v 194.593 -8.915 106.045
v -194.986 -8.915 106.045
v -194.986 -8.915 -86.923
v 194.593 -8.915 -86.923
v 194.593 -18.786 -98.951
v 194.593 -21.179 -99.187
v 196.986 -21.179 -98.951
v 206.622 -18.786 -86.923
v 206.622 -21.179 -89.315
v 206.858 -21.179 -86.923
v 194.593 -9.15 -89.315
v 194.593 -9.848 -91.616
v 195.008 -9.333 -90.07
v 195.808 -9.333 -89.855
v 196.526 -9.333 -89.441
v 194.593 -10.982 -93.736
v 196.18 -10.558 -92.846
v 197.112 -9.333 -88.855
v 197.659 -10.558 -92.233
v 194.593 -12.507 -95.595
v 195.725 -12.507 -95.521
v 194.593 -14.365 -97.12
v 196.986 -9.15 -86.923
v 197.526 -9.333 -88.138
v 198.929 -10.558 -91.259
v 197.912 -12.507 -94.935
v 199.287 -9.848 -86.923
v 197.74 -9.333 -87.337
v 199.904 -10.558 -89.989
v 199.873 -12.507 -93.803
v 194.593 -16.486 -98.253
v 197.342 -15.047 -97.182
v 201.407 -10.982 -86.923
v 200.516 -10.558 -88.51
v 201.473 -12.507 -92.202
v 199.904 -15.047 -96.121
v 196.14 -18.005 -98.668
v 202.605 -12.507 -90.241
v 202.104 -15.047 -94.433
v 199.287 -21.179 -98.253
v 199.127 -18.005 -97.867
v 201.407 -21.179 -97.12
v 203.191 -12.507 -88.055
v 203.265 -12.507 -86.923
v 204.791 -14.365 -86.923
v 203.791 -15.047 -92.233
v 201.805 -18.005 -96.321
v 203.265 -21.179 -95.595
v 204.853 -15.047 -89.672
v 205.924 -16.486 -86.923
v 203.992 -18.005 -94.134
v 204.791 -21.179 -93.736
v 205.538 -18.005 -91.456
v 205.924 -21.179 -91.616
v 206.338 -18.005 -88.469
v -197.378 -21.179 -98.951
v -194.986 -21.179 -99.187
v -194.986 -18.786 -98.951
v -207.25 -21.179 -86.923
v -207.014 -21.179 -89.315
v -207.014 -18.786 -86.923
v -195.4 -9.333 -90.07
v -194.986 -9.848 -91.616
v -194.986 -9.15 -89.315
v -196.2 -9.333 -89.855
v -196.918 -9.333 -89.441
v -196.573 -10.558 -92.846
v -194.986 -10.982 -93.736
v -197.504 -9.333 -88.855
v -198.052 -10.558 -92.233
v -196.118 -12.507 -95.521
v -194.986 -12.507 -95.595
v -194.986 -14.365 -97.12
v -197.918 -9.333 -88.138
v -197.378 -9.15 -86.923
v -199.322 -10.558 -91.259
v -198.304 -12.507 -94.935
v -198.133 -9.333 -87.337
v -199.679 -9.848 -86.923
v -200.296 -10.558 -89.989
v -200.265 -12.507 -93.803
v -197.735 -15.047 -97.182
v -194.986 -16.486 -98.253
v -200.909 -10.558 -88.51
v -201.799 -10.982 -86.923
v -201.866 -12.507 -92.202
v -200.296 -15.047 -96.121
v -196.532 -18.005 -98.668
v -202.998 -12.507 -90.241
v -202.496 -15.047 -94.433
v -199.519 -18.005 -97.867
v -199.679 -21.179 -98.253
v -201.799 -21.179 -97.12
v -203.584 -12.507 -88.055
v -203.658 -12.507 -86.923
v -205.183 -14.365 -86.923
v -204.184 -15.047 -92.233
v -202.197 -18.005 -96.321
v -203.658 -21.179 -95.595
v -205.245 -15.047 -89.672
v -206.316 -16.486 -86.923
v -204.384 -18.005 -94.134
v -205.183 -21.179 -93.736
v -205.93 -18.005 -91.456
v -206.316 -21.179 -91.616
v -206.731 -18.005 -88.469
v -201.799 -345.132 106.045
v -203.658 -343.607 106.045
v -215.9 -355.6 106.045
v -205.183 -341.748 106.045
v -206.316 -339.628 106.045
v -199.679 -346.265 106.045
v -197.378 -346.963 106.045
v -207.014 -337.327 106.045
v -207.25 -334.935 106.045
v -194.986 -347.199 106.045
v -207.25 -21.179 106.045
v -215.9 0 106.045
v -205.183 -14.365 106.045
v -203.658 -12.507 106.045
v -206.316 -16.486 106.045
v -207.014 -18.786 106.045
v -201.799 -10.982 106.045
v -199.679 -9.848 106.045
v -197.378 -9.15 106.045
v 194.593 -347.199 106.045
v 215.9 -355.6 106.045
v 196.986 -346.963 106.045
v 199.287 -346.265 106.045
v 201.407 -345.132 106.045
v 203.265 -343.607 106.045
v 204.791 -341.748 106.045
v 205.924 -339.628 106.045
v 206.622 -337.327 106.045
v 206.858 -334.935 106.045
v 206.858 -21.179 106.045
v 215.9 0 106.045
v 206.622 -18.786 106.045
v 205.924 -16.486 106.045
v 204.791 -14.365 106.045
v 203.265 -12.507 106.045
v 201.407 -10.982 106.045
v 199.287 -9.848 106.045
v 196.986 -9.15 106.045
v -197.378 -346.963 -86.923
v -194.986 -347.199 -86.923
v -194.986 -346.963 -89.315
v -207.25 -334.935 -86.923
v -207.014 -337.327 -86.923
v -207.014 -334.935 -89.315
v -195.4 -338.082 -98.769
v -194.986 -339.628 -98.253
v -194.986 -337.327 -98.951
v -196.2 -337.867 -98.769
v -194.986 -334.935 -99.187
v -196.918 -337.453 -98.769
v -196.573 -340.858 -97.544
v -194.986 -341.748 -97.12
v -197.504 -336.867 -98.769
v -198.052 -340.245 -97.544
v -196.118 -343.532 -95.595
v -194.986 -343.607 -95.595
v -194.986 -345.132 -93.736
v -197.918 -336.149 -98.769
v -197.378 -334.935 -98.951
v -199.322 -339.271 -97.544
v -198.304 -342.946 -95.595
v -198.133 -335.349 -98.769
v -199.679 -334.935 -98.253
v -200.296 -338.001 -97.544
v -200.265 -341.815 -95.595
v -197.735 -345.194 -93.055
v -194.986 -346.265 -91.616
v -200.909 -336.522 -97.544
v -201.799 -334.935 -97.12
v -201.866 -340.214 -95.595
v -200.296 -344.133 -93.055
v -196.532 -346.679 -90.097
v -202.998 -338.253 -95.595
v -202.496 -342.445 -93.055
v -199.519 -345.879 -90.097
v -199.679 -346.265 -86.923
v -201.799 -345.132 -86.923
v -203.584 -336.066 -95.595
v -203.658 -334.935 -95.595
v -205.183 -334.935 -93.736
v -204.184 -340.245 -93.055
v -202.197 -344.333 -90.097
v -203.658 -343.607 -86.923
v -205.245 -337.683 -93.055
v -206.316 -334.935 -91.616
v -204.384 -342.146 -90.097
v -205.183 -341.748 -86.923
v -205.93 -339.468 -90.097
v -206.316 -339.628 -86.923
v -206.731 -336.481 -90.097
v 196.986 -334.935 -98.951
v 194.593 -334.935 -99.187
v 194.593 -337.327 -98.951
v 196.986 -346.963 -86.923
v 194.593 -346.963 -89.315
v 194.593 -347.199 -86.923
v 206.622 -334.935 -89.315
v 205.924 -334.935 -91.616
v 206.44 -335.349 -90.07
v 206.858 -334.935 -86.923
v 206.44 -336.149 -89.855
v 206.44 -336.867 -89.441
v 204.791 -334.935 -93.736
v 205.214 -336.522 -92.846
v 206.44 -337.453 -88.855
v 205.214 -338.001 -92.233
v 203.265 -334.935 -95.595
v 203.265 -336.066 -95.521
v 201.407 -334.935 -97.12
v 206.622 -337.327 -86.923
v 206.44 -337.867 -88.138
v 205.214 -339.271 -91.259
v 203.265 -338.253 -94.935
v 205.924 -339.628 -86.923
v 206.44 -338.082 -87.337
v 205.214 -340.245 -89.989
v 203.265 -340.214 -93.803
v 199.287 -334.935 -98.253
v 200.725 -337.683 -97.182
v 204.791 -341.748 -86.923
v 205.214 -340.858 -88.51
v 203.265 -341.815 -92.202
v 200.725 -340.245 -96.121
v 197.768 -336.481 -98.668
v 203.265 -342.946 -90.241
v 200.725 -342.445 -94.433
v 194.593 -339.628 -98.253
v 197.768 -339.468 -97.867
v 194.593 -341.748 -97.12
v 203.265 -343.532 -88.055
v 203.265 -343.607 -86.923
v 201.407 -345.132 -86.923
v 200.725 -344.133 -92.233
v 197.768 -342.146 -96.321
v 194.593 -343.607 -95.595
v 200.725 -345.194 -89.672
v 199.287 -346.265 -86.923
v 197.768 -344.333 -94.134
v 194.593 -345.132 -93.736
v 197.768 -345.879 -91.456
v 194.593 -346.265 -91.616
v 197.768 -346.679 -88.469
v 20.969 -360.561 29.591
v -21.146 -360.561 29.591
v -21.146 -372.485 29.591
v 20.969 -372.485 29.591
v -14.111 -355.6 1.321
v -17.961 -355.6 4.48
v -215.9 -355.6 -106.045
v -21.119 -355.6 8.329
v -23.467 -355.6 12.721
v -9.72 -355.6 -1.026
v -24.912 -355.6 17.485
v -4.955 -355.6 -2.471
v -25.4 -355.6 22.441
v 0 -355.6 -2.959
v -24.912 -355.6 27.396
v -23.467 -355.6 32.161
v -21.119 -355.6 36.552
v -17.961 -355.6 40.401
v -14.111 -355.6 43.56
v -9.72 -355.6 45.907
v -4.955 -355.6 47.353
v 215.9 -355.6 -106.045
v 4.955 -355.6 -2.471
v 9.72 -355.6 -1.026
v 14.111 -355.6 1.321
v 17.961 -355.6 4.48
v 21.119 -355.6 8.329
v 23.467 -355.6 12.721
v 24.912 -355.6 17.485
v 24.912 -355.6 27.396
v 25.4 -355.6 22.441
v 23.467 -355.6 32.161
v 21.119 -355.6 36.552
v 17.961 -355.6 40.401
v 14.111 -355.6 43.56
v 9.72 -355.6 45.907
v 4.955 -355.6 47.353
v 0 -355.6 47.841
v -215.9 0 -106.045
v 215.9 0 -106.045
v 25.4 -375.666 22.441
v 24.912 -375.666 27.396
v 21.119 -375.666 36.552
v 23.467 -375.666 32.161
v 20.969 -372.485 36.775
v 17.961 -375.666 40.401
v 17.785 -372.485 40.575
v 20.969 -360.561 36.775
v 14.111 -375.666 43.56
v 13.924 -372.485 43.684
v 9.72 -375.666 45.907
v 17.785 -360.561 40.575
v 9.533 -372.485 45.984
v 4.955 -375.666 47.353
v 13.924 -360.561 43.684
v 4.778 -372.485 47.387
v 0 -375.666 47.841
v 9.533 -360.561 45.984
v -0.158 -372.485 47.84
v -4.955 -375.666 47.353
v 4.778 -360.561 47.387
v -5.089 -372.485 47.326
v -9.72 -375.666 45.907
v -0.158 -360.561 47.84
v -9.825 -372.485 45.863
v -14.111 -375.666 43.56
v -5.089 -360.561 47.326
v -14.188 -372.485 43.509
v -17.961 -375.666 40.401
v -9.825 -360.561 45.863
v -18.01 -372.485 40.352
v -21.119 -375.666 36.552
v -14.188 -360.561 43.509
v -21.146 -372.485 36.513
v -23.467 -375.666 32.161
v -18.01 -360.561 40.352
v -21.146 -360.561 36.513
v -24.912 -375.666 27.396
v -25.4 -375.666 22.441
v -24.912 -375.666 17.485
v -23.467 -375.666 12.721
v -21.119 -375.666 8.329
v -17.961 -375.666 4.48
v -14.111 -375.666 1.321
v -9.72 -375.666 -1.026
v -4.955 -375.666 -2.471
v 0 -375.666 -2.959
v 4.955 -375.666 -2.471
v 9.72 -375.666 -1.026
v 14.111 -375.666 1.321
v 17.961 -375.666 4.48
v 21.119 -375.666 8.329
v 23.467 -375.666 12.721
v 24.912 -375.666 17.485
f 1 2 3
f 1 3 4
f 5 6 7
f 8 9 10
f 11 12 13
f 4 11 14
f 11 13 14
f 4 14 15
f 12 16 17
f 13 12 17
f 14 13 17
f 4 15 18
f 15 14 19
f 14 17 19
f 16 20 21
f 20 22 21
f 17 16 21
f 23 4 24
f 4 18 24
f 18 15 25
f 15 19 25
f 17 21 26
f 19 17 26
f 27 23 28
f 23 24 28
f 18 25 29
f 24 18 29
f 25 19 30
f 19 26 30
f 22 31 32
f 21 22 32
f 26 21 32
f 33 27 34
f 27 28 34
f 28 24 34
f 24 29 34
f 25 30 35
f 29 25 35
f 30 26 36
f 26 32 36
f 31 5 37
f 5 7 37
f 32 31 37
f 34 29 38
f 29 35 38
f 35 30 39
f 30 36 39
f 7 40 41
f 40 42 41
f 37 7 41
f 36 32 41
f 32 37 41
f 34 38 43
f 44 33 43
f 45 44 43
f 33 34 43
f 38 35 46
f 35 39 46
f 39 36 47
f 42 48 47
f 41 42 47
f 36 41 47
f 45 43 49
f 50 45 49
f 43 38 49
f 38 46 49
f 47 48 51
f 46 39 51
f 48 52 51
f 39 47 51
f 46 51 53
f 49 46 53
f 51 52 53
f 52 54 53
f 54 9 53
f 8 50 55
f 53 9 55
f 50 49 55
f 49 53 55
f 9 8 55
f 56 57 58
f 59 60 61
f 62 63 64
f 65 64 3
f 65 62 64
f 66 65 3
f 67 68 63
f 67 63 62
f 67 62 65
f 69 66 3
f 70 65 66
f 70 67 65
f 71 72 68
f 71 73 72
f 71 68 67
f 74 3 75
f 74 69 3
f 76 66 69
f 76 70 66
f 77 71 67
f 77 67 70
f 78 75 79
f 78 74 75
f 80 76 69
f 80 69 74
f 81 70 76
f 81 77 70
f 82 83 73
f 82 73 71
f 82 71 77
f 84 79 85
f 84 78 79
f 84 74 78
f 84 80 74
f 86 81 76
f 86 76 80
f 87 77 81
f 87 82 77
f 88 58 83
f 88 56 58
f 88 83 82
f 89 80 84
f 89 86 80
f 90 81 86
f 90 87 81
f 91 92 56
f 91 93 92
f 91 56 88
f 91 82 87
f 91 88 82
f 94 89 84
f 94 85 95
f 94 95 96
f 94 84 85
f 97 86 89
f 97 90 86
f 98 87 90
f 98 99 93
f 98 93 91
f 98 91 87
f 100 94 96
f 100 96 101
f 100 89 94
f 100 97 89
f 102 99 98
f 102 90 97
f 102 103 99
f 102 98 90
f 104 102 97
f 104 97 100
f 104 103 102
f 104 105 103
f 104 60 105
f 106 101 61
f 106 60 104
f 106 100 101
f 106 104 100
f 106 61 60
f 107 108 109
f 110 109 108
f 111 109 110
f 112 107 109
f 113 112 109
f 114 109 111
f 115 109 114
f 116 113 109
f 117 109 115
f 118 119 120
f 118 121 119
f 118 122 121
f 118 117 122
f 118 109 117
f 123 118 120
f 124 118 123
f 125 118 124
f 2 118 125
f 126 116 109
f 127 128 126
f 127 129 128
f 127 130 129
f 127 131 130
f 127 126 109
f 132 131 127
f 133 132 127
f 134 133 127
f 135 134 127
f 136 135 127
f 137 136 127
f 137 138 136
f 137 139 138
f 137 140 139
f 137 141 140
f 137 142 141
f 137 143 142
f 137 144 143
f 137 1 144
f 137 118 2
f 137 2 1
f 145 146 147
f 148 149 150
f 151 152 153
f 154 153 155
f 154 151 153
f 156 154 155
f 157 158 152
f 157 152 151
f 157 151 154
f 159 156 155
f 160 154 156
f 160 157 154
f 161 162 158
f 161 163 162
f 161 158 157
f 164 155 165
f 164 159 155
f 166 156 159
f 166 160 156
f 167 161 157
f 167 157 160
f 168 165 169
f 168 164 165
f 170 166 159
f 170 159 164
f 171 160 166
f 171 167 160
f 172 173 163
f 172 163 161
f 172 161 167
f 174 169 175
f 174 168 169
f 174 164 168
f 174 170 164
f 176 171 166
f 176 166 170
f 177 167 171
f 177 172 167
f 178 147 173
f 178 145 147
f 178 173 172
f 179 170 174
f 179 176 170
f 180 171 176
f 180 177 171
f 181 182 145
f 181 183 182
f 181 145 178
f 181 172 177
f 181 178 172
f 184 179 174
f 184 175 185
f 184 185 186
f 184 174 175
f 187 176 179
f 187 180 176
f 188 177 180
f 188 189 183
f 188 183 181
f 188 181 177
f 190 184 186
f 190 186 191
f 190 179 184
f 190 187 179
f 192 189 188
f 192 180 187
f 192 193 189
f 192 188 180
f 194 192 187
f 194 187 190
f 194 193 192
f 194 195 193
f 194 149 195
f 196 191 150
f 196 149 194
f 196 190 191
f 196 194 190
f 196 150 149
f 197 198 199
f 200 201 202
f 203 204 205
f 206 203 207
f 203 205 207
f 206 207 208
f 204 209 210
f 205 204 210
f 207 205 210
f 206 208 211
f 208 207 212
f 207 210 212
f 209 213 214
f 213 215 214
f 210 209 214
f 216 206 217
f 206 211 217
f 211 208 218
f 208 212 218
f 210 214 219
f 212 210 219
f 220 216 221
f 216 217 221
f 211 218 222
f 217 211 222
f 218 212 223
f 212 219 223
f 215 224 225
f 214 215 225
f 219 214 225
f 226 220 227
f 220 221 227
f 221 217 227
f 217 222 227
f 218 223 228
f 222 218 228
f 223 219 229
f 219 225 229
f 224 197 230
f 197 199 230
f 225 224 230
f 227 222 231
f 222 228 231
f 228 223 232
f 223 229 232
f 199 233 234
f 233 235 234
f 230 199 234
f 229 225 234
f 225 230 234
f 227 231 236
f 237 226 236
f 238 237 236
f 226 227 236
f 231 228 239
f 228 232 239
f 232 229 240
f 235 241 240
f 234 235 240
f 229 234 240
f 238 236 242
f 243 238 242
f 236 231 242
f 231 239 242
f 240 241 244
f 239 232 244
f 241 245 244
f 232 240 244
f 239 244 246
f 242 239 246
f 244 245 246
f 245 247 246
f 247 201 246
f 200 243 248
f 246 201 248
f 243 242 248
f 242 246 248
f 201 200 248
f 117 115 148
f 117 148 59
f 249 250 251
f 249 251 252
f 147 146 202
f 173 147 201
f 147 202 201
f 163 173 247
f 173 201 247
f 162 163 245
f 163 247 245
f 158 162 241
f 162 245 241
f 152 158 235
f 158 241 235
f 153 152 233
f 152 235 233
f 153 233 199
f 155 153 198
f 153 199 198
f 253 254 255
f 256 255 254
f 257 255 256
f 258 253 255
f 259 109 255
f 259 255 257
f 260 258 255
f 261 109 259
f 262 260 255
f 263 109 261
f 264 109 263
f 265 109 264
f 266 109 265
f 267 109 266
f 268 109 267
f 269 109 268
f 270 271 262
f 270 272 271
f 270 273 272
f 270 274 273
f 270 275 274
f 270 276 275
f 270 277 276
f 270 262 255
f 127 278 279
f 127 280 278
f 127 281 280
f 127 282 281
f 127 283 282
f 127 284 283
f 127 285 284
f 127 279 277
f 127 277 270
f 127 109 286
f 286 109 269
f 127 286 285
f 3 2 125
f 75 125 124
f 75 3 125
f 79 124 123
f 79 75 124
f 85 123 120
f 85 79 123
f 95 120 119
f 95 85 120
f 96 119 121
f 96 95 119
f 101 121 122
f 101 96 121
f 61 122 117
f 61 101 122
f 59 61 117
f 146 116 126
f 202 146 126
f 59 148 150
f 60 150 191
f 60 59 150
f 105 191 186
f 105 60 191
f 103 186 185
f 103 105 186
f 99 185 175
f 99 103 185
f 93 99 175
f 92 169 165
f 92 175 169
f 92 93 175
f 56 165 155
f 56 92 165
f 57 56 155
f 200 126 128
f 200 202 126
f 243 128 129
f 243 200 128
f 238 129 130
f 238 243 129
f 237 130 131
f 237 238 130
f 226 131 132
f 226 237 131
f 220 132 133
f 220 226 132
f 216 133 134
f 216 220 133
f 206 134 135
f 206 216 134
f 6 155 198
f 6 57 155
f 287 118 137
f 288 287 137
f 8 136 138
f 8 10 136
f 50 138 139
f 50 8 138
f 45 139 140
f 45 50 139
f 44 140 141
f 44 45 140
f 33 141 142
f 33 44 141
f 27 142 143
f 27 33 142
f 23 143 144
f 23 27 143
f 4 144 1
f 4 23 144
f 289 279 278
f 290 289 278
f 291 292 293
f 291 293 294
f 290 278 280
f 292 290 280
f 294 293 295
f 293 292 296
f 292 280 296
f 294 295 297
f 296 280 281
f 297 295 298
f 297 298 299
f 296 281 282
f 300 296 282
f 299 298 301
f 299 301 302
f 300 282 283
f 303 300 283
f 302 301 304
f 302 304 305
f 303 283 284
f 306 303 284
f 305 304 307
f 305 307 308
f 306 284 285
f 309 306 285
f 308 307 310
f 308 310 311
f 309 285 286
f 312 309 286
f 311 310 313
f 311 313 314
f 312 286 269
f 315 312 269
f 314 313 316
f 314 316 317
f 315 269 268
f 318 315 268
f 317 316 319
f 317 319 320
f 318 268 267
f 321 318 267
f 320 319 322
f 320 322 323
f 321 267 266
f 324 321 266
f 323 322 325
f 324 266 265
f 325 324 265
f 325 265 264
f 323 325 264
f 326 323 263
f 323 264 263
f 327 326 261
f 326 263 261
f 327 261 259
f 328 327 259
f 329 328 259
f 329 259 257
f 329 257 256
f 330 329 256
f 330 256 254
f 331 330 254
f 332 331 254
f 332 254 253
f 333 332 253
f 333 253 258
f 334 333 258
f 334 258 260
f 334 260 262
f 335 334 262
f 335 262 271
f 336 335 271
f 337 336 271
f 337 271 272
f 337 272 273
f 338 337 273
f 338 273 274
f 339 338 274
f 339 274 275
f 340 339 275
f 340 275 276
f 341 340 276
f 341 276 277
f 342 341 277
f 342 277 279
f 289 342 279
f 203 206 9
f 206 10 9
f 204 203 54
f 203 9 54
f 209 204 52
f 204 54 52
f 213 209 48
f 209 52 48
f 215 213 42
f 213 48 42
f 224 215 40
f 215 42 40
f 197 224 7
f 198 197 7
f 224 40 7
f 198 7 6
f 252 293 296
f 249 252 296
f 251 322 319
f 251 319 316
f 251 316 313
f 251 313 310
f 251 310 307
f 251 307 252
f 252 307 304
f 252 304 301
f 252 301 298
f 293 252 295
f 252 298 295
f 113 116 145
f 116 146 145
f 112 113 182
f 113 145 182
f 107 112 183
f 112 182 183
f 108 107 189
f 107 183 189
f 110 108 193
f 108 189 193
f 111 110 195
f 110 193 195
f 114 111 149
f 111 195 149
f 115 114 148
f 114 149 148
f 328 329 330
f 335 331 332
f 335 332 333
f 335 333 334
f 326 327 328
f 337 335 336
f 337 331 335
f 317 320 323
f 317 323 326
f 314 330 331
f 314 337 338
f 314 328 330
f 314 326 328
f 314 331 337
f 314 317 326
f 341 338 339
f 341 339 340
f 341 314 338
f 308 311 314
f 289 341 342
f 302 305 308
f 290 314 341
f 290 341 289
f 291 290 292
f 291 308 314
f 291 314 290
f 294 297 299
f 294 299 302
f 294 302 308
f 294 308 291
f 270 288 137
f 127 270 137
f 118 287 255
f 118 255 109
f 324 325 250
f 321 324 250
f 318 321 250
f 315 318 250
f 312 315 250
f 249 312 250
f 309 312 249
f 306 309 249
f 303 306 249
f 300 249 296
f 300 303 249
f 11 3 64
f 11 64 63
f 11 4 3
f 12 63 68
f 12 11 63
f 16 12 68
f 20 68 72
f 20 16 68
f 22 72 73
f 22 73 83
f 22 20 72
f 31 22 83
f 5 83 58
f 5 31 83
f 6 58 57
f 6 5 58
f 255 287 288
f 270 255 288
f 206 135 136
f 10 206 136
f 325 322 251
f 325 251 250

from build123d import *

# Parameters (mm, degrees)
F0_W     = 431.8
F0_H     = 212.09
F1_DEPTH = 355.6
F2_W     = 414.10742
F2_H     = 338.284008
F3_DEPTH = 205.232
F4_R     = 25.4
F5_DEPTH = 20.066
F6_R     = 12.264205
F7_W     = 42.114318
F7_H     = 11.923939
F8_DEPTH = 76.454


with BuildPart() as f1:
    # F0 (on Front) → F1 (new body)
    with BuildSketch(Plane.XZ):
        Rectangle(F0_W, F0_H)
    extrude(amount=F1_DEPTH)

    # F2 (on face) → F3 (cut)
    with BuildSketch(Plane.XY.offset(106.045)):
        with Locations((-0.196185, -178.056706)):
            Rectangle(F2_W, F2_H)
    extrude(amount=-F3_DEPTH, mode=Mode.SUBTRACT)

    # F4 (on face) → F5 (join)
    with BuildSketch(Plane.XZ.offset(355.6)):
        with Locations((0, 22.440701)):
            Circle(F4_R)
    extrude(amount=F5_DEPTH)

    # F6
    f6_edges = [f1.edges().sort_by_distance(p)[0] for p in [
        (-207.249895, -347.19871, 3.429),
        (-0.196185, -347.19871, -99.187),
        (-207.249895, -178.056706, -99.187),
        (206.857525, -178.056706, -99.187),
        (206.857525, -347.19871, 3.429),
        (-0.196185, -8.914702, -99.187),
        (-207.249895, -8.914702, 3.429),
        (206.857525, -8.914702, 3.429),
    ]]
    fillet(f6_edges, radius=F6_R)

    # F7 (on face) → F8 (cut)
    with BuildSketch(Plane.XY.offset(106.045)):
        with Locations((-0.088485, -366.523399)):
            Rectangle(F7_W, F7_H)
    extrude(amount=-F8_DEPTH, mode=Mode.SUBTRACT)


solid = f1.part
